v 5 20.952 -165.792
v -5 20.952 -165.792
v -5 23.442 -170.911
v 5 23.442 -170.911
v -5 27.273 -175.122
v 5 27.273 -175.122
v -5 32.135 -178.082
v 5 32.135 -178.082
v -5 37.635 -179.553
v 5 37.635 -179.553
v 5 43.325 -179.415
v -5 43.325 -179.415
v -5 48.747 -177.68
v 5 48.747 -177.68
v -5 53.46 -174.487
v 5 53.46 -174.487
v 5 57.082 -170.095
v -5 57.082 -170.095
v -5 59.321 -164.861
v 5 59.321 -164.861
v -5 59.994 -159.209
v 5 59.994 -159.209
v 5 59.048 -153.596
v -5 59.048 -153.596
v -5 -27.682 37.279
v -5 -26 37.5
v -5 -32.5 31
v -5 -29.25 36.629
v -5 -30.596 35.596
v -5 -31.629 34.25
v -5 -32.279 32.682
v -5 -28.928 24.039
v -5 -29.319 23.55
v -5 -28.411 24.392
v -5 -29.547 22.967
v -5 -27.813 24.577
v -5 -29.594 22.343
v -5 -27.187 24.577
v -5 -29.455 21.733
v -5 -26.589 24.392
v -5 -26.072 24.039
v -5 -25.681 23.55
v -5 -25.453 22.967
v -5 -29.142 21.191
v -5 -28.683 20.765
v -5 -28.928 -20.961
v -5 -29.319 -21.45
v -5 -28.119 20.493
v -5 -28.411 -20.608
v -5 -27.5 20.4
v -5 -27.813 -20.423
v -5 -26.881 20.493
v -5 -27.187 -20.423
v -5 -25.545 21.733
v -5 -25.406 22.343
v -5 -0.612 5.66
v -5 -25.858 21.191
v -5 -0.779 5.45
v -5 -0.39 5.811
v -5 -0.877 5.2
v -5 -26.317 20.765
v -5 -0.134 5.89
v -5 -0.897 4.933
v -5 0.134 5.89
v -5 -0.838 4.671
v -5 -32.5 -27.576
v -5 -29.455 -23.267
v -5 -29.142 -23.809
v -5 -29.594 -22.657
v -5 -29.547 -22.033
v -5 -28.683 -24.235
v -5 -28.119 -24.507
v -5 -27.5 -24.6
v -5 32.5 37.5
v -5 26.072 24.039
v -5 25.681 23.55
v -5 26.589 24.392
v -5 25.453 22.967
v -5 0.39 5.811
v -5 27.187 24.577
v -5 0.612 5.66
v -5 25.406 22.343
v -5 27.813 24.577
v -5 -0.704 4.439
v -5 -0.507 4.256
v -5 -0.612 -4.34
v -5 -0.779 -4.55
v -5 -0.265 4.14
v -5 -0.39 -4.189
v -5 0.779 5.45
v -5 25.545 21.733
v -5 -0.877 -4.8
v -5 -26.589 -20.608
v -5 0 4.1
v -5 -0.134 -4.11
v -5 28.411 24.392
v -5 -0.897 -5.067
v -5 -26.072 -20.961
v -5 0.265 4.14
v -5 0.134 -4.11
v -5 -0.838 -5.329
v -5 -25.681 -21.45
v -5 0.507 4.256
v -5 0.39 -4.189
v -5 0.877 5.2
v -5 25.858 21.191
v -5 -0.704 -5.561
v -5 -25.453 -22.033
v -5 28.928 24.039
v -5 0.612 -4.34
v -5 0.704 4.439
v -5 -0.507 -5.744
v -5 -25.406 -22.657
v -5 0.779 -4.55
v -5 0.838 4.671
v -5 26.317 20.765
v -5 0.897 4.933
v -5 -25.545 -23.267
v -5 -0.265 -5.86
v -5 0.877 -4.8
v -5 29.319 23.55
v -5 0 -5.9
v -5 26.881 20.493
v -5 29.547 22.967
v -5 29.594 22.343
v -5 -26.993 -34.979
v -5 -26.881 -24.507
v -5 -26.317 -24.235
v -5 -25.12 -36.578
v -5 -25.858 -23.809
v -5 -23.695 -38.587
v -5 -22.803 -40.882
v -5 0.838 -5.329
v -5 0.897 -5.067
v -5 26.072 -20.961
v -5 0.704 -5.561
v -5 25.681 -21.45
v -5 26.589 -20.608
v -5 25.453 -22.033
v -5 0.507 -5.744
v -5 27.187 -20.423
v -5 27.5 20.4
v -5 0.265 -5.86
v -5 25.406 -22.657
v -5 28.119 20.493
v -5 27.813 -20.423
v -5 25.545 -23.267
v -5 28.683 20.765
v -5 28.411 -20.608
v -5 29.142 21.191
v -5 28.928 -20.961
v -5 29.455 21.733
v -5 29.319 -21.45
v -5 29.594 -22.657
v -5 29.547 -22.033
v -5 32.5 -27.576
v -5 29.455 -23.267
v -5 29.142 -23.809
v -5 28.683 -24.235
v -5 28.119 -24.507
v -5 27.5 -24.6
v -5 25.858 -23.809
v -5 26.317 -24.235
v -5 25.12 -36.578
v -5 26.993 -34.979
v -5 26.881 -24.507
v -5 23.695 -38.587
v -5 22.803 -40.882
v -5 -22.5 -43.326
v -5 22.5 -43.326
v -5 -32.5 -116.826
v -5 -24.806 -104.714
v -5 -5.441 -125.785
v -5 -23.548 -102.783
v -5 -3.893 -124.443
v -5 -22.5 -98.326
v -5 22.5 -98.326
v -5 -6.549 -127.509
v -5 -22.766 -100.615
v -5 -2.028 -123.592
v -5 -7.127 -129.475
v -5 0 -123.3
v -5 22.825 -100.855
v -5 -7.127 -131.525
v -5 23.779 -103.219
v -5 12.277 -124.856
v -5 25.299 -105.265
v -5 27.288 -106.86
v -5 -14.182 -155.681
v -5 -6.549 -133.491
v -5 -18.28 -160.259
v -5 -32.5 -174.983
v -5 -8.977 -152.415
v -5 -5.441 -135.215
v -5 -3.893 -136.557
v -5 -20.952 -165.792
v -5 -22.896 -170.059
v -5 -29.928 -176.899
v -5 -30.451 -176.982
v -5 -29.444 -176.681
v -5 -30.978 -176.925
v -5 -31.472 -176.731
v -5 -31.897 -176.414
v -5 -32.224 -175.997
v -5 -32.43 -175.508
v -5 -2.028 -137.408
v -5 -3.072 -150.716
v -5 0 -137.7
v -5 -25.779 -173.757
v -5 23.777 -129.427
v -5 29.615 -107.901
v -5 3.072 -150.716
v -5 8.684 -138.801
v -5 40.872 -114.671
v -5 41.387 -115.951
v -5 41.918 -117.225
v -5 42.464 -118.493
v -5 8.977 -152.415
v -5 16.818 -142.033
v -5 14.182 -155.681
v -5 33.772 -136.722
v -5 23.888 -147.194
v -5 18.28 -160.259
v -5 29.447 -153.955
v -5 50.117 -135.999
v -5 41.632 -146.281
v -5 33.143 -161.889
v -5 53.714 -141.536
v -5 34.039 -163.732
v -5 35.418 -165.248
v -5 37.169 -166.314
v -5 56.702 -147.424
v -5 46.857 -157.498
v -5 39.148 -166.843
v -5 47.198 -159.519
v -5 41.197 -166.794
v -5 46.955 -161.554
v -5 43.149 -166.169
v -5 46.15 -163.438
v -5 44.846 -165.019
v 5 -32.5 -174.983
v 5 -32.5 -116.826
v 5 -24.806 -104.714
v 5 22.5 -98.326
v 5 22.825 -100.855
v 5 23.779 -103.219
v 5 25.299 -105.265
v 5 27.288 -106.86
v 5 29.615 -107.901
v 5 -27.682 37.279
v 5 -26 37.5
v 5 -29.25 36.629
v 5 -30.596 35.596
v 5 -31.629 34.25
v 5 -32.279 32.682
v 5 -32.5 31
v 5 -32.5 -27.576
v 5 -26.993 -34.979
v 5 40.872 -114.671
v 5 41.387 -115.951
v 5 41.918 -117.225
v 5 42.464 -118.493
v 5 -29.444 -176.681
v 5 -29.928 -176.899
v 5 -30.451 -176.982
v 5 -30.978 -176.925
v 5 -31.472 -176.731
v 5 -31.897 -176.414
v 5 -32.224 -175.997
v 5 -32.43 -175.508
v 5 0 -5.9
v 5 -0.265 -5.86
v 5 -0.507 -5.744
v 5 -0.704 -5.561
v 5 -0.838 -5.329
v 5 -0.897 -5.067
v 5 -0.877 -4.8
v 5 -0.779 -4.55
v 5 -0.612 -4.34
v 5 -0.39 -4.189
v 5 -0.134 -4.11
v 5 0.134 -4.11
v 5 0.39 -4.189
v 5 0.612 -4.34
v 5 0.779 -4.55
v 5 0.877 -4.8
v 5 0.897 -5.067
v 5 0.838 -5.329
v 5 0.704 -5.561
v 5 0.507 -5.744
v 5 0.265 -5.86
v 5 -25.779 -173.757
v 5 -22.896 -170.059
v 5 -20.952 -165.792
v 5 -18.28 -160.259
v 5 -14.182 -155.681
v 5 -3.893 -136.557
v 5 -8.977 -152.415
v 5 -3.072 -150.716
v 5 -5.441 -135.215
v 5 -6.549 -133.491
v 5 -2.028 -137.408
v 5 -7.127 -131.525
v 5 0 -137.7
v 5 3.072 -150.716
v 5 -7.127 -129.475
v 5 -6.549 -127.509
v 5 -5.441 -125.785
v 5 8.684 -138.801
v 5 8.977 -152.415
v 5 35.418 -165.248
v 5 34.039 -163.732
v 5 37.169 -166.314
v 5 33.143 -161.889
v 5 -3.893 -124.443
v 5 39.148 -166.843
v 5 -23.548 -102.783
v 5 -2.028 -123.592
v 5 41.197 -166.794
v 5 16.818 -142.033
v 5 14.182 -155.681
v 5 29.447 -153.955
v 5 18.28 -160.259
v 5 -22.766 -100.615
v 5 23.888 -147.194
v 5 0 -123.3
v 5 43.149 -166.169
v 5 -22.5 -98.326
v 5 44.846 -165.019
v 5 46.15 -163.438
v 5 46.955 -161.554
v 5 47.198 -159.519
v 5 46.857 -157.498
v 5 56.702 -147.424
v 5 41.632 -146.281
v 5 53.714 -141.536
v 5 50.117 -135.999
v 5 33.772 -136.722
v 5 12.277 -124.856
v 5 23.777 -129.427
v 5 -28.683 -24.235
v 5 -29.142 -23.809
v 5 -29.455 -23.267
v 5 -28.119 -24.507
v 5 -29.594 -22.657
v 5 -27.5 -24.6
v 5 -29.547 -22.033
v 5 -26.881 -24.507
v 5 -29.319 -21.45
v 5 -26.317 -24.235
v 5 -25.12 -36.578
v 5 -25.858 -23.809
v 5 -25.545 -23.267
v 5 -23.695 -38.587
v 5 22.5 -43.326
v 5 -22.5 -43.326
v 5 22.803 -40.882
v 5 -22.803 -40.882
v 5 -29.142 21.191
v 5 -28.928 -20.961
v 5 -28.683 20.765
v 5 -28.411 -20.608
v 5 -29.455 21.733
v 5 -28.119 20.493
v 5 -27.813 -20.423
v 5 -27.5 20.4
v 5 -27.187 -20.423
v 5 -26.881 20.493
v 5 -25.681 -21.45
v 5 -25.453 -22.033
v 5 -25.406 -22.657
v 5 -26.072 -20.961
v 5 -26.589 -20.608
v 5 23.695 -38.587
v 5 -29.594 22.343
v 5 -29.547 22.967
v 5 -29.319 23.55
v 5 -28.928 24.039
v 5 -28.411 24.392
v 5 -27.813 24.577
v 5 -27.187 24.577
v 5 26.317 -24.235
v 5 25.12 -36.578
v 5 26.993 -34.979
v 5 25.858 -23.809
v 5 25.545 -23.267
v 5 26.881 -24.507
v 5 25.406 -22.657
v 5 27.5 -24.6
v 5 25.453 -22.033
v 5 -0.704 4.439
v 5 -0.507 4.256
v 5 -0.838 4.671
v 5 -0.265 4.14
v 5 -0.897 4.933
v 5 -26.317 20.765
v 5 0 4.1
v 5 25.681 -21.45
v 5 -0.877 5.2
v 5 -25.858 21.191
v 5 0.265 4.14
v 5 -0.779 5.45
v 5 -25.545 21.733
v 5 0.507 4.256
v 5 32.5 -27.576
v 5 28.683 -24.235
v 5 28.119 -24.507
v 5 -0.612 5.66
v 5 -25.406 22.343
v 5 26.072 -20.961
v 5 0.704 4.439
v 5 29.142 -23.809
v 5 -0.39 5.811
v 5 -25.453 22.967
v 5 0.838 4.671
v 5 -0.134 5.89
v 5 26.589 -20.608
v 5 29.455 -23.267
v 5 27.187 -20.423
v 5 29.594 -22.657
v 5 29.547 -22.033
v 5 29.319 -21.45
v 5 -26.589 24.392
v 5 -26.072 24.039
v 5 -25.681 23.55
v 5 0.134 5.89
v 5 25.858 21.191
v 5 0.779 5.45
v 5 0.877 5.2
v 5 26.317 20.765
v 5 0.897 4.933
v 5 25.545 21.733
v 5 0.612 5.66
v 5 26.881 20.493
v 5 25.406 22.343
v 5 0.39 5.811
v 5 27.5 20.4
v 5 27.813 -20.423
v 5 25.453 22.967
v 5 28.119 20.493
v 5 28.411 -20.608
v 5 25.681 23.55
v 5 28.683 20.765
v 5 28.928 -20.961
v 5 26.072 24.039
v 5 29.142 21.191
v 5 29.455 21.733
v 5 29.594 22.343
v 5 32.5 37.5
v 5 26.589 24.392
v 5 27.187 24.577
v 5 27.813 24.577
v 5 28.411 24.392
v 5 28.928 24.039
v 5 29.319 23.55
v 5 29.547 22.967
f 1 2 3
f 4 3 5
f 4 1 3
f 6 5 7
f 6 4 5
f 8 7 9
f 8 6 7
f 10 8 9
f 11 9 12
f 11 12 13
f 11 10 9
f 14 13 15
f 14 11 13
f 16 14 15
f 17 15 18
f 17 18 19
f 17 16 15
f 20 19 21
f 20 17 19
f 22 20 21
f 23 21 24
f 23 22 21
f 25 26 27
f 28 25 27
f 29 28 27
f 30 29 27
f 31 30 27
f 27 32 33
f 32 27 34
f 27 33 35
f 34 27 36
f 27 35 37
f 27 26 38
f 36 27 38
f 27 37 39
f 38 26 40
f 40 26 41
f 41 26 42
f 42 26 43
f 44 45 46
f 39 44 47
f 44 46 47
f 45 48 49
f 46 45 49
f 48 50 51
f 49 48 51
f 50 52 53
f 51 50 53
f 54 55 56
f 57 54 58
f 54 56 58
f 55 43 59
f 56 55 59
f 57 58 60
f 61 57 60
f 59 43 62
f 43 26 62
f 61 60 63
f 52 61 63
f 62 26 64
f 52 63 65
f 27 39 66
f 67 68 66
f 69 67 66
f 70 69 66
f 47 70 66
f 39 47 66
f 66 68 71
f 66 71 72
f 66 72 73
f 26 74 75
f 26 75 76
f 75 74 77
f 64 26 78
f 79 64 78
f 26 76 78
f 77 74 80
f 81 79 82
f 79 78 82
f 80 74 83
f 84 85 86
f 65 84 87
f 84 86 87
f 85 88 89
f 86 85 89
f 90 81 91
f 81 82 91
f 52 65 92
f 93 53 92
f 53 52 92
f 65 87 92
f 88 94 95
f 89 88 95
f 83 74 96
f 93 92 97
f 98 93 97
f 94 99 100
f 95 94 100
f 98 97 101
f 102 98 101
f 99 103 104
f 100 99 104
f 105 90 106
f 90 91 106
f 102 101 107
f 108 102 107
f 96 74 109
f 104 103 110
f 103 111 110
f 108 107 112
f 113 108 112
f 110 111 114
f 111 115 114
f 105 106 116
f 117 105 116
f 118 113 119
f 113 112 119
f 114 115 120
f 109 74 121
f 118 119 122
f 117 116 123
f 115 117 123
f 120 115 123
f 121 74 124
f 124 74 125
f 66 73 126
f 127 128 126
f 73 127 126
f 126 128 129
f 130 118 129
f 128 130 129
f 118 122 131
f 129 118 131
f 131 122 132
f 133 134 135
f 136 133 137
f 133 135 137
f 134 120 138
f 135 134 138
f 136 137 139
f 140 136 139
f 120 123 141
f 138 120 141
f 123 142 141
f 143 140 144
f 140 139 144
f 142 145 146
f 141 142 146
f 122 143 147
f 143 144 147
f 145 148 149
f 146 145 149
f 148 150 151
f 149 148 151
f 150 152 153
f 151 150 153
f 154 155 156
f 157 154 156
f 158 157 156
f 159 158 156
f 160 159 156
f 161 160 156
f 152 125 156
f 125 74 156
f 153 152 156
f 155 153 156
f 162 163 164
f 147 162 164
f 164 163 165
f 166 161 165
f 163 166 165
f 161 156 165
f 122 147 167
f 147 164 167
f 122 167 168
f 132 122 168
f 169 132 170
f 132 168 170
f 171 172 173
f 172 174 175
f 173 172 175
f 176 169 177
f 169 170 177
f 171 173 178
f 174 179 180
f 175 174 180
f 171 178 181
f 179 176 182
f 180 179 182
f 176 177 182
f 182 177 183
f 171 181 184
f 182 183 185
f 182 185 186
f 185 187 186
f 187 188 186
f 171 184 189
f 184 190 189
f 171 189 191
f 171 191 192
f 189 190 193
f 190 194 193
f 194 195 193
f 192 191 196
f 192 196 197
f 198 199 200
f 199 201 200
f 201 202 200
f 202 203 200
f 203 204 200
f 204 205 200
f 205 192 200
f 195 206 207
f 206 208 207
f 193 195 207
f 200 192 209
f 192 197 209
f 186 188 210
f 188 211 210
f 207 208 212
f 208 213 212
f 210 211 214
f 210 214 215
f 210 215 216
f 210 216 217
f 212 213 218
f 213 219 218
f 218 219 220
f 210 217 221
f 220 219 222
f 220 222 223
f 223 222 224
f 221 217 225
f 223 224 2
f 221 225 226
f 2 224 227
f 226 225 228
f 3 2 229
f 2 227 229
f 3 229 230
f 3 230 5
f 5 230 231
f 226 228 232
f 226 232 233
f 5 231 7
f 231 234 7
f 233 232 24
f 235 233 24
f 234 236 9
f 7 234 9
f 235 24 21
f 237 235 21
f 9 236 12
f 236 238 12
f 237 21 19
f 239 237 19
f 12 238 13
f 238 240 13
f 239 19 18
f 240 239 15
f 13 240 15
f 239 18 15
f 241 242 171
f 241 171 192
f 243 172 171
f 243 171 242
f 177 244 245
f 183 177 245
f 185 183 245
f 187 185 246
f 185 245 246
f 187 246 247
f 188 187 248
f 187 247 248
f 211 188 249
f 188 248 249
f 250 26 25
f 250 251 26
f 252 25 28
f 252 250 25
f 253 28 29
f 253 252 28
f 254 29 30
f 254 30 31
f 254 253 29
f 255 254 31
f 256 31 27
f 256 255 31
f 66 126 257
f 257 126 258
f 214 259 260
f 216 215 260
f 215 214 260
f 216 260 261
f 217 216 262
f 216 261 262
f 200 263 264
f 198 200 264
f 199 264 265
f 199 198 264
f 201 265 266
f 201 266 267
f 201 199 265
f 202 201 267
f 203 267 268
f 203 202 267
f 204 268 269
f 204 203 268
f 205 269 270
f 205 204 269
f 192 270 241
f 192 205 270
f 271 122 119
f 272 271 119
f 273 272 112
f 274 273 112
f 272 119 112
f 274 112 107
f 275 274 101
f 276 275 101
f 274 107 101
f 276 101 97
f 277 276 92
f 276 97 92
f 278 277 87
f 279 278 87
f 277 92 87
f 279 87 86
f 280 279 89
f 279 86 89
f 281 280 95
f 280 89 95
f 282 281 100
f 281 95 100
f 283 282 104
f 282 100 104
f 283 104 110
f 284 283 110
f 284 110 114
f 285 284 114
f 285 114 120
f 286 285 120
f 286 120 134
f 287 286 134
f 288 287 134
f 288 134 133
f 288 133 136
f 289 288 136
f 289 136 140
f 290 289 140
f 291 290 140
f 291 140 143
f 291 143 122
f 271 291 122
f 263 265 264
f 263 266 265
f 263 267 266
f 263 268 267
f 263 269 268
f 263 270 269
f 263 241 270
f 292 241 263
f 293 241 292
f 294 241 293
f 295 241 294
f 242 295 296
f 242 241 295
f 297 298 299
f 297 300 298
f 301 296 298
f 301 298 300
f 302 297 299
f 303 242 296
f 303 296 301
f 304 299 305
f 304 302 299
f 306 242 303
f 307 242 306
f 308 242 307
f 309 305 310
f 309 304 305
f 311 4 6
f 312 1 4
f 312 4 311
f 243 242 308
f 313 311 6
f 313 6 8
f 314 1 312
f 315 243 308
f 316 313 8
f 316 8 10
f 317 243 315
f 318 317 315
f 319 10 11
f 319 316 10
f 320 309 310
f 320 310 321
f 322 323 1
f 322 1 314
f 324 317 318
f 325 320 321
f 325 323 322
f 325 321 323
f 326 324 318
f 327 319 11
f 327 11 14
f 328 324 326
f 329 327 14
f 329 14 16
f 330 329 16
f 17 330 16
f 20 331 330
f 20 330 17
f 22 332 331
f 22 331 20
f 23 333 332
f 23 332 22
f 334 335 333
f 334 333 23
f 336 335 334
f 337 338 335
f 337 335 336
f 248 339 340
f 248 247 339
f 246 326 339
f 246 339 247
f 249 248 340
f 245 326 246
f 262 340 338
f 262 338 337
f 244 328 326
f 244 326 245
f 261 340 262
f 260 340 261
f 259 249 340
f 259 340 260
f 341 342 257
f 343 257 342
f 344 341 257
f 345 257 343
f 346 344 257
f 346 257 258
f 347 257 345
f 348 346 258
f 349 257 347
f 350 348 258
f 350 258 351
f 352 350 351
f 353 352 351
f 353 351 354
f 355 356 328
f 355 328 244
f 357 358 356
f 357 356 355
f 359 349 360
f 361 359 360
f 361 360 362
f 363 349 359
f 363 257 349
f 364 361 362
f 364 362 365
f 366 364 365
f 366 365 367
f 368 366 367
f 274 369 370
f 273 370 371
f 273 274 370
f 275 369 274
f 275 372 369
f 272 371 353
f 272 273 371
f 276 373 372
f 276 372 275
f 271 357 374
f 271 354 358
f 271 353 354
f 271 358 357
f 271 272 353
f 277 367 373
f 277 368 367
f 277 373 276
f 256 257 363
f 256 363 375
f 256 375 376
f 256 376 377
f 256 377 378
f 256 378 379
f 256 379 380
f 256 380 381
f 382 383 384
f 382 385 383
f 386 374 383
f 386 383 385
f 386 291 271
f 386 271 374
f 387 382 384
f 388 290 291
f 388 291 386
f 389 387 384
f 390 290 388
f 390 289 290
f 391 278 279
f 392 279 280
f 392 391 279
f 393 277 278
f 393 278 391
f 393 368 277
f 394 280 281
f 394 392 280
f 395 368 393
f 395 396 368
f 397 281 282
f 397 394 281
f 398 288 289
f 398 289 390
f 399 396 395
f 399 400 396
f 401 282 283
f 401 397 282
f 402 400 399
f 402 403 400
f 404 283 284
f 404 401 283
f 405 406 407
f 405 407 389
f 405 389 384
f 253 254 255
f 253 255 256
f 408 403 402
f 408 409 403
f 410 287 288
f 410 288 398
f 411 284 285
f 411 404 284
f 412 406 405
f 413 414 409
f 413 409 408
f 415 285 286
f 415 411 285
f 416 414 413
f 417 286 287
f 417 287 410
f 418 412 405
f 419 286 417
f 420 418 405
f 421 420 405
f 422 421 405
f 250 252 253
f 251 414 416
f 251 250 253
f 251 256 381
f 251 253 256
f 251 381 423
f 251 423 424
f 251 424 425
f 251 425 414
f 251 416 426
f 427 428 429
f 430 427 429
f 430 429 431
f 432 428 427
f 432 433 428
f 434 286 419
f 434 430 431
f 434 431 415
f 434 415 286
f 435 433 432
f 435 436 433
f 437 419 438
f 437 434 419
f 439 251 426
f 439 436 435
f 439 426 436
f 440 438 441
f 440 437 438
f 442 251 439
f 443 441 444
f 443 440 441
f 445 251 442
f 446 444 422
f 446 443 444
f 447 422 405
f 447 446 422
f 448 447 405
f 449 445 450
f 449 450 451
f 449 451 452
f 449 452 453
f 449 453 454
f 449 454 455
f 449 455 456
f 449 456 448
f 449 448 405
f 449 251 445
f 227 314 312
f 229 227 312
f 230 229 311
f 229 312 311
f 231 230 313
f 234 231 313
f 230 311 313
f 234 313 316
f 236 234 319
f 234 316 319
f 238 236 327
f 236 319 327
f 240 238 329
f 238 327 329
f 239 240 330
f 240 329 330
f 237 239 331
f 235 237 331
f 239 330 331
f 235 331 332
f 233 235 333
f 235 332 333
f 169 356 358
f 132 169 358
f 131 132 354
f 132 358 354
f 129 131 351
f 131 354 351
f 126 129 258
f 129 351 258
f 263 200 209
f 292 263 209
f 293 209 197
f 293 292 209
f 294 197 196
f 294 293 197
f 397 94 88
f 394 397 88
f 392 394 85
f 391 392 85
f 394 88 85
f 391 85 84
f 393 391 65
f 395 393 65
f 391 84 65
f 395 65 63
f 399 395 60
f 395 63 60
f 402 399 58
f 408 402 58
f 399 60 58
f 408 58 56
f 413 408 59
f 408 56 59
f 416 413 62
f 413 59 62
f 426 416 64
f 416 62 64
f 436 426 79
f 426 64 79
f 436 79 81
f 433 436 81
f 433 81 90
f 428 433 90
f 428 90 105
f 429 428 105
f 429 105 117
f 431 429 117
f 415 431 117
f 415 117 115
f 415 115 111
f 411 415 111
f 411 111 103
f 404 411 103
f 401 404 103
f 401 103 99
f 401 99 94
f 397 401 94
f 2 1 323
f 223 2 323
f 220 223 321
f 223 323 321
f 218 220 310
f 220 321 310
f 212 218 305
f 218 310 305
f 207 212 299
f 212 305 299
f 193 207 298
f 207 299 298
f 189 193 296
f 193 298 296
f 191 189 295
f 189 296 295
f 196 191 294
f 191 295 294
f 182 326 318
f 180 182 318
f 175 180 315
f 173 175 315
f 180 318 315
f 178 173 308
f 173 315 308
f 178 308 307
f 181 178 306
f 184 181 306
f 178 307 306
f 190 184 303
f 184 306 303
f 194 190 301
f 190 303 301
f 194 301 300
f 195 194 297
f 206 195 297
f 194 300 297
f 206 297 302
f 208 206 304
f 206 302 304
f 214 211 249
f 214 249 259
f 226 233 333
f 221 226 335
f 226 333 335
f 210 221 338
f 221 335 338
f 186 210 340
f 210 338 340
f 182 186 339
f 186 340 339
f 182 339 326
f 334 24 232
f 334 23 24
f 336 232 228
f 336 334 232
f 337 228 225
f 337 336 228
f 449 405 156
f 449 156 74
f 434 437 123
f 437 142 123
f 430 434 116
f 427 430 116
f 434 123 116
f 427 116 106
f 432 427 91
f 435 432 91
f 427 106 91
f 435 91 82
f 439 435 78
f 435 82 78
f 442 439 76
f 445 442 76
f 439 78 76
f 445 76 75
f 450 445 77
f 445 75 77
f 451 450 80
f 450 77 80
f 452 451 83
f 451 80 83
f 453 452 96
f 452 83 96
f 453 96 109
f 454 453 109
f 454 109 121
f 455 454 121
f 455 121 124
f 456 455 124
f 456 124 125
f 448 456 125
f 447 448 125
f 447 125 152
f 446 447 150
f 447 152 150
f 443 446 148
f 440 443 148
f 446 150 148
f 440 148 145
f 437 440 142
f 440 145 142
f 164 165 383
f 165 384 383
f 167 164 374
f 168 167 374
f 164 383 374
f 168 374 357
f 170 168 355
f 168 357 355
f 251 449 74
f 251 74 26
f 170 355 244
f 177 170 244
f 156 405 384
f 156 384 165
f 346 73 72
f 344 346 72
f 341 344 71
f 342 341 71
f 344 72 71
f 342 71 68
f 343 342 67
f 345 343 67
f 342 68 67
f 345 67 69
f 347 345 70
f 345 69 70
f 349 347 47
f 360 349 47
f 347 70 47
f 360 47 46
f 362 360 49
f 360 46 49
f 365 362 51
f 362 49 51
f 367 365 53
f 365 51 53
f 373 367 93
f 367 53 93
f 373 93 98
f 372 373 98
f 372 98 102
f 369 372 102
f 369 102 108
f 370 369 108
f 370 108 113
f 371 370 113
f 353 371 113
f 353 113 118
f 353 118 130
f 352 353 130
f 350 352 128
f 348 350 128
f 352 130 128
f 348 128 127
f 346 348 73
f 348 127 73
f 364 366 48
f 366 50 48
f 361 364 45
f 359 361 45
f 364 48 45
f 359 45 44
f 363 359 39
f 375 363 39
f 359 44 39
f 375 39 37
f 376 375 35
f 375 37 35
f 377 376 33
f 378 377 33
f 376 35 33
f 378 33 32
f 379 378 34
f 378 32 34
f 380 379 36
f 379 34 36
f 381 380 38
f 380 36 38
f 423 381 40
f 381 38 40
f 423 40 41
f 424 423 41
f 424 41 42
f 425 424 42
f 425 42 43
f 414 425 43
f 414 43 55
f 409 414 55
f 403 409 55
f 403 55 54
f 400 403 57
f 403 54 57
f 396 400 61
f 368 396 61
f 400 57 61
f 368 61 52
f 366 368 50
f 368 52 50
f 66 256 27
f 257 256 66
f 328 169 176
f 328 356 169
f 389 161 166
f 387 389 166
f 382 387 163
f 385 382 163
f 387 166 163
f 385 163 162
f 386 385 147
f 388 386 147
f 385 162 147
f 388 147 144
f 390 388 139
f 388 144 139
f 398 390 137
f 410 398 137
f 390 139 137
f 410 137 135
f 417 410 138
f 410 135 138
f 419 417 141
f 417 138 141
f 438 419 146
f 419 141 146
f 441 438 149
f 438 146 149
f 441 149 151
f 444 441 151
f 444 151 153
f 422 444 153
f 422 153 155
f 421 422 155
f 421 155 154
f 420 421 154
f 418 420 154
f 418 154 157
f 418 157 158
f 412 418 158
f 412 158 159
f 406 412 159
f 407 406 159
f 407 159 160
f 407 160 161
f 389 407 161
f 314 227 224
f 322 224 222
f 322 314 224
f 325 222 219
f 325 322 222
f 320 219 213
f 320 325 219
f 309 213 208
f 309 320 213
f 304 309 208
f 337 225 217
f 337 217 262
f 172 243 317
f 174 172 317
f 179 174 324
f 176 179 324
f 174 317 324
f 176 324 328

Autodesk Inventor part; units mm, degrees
ref_plane "YZ Plane" through (0, 0, 0) normal (1, 0, 0) x (0, 1, 0)
ref_plane "XZ Plane" through (0, 0, 0) normal (0, 1, 0) x (-1, 0, 0)
ref_plane "XY Plane" through (0, 0, 0) normal (0, 0, 1) x (1, 0, 0)
sketch "Sketch1" plane through (0, 0, 0) normal (1, 0, 0) x (0, 1, 0)
  line L0 (-27.5, 22.5) -> (27.5, 22.5)
  line L1 (27.5, 22.5) -> (27.5, -22.5)
  line L2 (27.5, -22.5) -> (-27.5, -22.5)
  line L3 (-27.5, -22.5) -> (-27.5, 22.5)
  line L4 (-27.5, 22.5) -> (27.5, -22.5) construction
  line L5 (27.5, 22.5) -> (-27.5, -22.5) construction
  line L6 (32.5, 37.5) -> (-32.5, 37.5)
  line L7 (-32.5, 37.5) -> (-32.5, -162.5)
  line L8 (-32.5, -162.5) -> (32.5, -162.5)
  line L9 (32.5, -162.5) -> (32.5, 37.5)
  line L10 (0, 0) -> (0, -107.0279) construction
  dimension "d0" = 45
  dimension "d1" = 55
  dimension "d2" = 65
  dimension "d3" = 200
  dimension "d4" = 15
extrude "Extrusion1" add sketch "Sketch1" along normal mid plane 10 contours L0 L1 L2 L3 | L9 L8 L7 L6
hole "Hole1" at (0, 27.5, 22.5) at (0, -27.5, 22.5) at (0, -27.5, -22.5) at (0, 27.5, -22.5) direction (-1, 0, 0) diameter 4.2 end through all both
sketch "Sketch3" plane through (5, 0, 0) normal (1, 0, 0) x (0, 0, -1)
  circle A0 centre (22.5, -27.5) radius 2.1 projected
  circle A1 centre (-22.5, 27.5) radius 2.1 projected
  circle A2 centre (-22.5, -27.5) radius 2.1 projected
  circle A3 centre (22.5, 27.5) radius 2.1 projected
  line L0 (-37.5, -32.5) -> (162.5, -32.5) projected
  line L1 (162.5, -32.5) -> (162.5, 32.5) projected
  line L2 (162.5, 32.5) -> (-37.5, 32.5) projected
  line L3 (-37.5, 32.5) -> (-37.5, -32.5) projected
  line L4 (162.5, 0) -> (-37.5, 0) construction
  line L5 (-37.5, 32.5) -> (-37.5, -32.5) projected
  line L6 (162.5, -32.5) -> (162.5, 32.5) projected
  arc A4 (159.6938, 40) -> (159.6938, -40) centre (172.5, 0) ccw construction
  arc A5 (153.5955, 59.0476) -> (153.5955, -59.0476) centre (172.5, 0) ccw
  arc A6 (165.792, 20.9524) -> (165.792, -20.9524) centre (172.5, 0) ccw
  arc A7 (165.792, 20.9524) -> (153.5955, 59.0476) centre (159.6938, 40) ccw
  arc A8 (153.5955, -59.0476) -> (165.792, -20.9524) centre (159.6938, -40) ccw
  arc A9 (157.4984, 46.8571) -> (157.4984, -46.8571) centre (172.5, 0) ccw
  arc A10 (157.4984, -46.8571) -> (161.8891, -33.1429) centre (159.6938, -40) ccw
  arc A11 (161.8891, 33.1429) -> (161.8891, -33.1429) centre (172.5, 0) ccw
  arc A12 (161.8891, 33.1429) -> (157.4984, 46.8571) centre (159.6938, 40) ccw
  circle A13 centre (130.5, 0) radius 7.2
  point P0 (0, 0)
  point P1 (162.5, 0)
  point P2 (135.5623, -32.5)
  point P3 (119.7009, -32.5)
  point P4 (113.3868, -25)
  point P5 (160.0585, -32.5)
  point P6 (160.0585, 32.5)
  point P7 (113.3868, 25)
  point P8 (119.7009, 32.5)
  point P9 (135.5623, 32.5)
  point P10 (116.802, 25)
  point P11 (116.802, -25)
  point P12 (123.3, 0)
  point P13 (137.7, 0)
  point P14 (162.5, -19.5959)
  point P15 (162.5, 19.5959)
  dimension "d27" = 42
  dimension "d28" = 20
  dimension "d29" = 10
  dimension "d30" = 80
  dimension "d32" = 7.2
extrude "Extrusion2" add sketch "Sketch3" against normal blind 10 contours A5 L2 A9 L0 | L0 A9 A10 A11 L1 A6 A8 A5 | A9 A13 A11 L0 | L0 A11 A10 A9 | A5 A7 A6 L1 L2 A11 A12 A9 | A11 L2 L1 A6 L0 | A9 L2 A11 A13 | A13 | A9 A12 A11 L2
extrude "Extrusion3" cut sketch "Sketch3" against normal blind 85 contours A9 L2 A11 A13 | A13 | A9 A12 A11 L2
extrude "Extrusion4" cut sketch "Sketch3" against normal blind 85 contours A6 L1
chamfer "Chamfer1" distance 24 angle 45 2 edges at (0, 32.5, -119.7009) (0, -32.5, -119.7009)
fillet "Fillet1" radius 119 2 edges at (0, 32.5, -95.7009) (0, -32.5, -95.7009)
sketch "Sketch4" plane through (5, 0, 0) normal (1, 0, 0) x (0, 0, -1)
  arc A0 (118.4927, -42.4637) -> (70.8263, -32.5) centre (70.8263, -151.5) ccw projected
  line L0 (70.8263, -32.5) -> (178.2342, -32.5)
  arc A1 (153.5955, -59.0476) -> (165.792, -20.9524) centre (159.6938, -40) ccw projected
  arc A2 (135.9994, -50.1169) -> (153.5955, -59.0476) centre (172.5, 0) ccw projected
  line L1 (135.9994, -50.1169) -> (118.4927, -42.4637) projected
  point P0 (0, 0)
extrude "Extrusion5" cut sketch "Sketch4" against normal blind 36.25
fillet "Fillet2" radius 2 1 edges at (0, -32.5, -178.2342)
sketch "Sketch5" plane through (5, 0, 0) normal (1, 0, 0) x (0, 0, -1)
  line L0 (0, 0) -> (0, 9.6714)
  line L1 (-5, 0) -> (5, 0)
  dimension "d46" = 10
hole "Hole3" at (5, 0, -5) at (5, 0, 5) direction (-1, 0, 0) diameter 1.8 end through all
sketch "Sketch6" plane through (5, 0, 0) normal (1, 0, 0) x (0, 0, -1)
  circle A0 centre (5, 0) radius 0.9 projected
  circle A1 centre (-5, 0) radius 0.9 projected
  arc A2 (174.9826, -32.5) -> (176.6814, -29.4444) centre (174.9826, -30.5) ccw projected
  arc A3 (176.6814, -29.4444) -> (165.792, -20.9524) centre (159.6938, -40) ccw projected
  arc A4 (165.792, 20.9524) -> (165.792, -20.9524) centre (172.5, 0) ccw projected
  arc A5 (165.792, 20.9524) -> (153.5955, 59.0476) centre (159.6938, 40) ccw projected
  arc A6 (153.5955, 59.0476) -> (135.9994, 50.1169) centre (172.5, 0) ccw projected
  line L0 (118.4927, 42.4637) -> (135.9994, 50.1169) projected
  arc A7 (70.8263, 32.5) -> (118.4927, 42.4637) centre (70.8263, 151.5) ccw projected
  line L1 (70.8263, 32.5) -> (-37.5, 32.5) projected
  line L2 (-37.5, 32.5) -> (-37.5, -32.5) projected
  line L3 (-37.5, -32.5) -> (174.9826, -32.5) projected
  circle A8 centre (22.5, 27.5) radius 2.1 projected
  circle A9 centre (-22.5, -27.5) radius 2.1 projected
  circle A10 centre (-22.5, 27.5) radius 2.1 projected
  circle A11 centre (22.5, -27.5) radius 2.1 projected
  arc A12 (123.3, 0) -> (137.7, 0) centre (130.5, 0) ccw projected
  arc A13 (157.4984, 46.8571) -> (123.3, 0) centre (172.5, 0) ccw projected
  arc A14 (161.8891, 33.1429) -> (157.4984, 46.8571) centre (159.6938, 40) ccw projected
  arc A15 (161.8891, 33.1429) -> (137.7, 0) centre (172.5, 0) ccw projected
  line L4 (-37.5, 32.5) -> (70.8263, 32.5) projected
  line L5 (70.8263, 32.5) -> (70.8263, -32.5) construction
  line L6 (174.9826, -32.5) -> (-37.5, -32.5) projected
  line L7 (43.3263, 32.5) -> (98.3263, 32.5) construction
  line L8 (70.8263, 32.5) -> (-37.5, 32.5) projected
  line L9 (43.3263, 22.5) -> (98.3263, 22.5)
  line L10 (98.3263, 42.5) -> (43.3263, 42.5)
  arc A16 (43.3263, 42.5) -> (43.3263, 22.5) centre (43.3263, 32.5) ccw
  arc A17 (98.3263, 22.5) -> (98.3263, 42.5) centre (98.3263, 32.5) ccw
  line L11 (70.8263, 0) -> (130.5, 0) construction
  line L12 (43.3263, -22.5) -> (98.3263, -22.5)
  line L13 (98.3263, -42.5) -> (43.3263, -42.5)
  arc A18 (43.3263, -22.5) -> (43.3263, -42.5) centre (43.3263, -32.5) ccw
  arc A19 (98.3263, -42.5) -> (98.3263, -22.5) centre (98.3263, -32.5) ccw
  point P0 (0, 0)
  point P1 (106.6621, 38.024)
  point P2 (33.3263, 32.5)
  dimension "d57" = 10
  dimension "d58" = 55
extrude "Extrusion6" cut sketch "Sketch6" against normal blind 27.5 contours A19 L13 A18 L3 | L3 A18 L12 A19 | L1 A7 A17 L9 A16
chamfer "Chamfer2" distance 8.5 angle 45 2 edges at (0, -32.5, -108.3263) (0, 38.024, -106.6621)
chamfer "Chamfer3" distance 5.75 angle 45 2 edges at (0, -32.5, -33.3263) (0, 32.5, -33.3263)
fillet "Fillet3" radius 6.5 1 edges at (0, -32.5, 37.5)
properties part number "16_Khau_hai" material "Stainless Steel, Austenitic"
